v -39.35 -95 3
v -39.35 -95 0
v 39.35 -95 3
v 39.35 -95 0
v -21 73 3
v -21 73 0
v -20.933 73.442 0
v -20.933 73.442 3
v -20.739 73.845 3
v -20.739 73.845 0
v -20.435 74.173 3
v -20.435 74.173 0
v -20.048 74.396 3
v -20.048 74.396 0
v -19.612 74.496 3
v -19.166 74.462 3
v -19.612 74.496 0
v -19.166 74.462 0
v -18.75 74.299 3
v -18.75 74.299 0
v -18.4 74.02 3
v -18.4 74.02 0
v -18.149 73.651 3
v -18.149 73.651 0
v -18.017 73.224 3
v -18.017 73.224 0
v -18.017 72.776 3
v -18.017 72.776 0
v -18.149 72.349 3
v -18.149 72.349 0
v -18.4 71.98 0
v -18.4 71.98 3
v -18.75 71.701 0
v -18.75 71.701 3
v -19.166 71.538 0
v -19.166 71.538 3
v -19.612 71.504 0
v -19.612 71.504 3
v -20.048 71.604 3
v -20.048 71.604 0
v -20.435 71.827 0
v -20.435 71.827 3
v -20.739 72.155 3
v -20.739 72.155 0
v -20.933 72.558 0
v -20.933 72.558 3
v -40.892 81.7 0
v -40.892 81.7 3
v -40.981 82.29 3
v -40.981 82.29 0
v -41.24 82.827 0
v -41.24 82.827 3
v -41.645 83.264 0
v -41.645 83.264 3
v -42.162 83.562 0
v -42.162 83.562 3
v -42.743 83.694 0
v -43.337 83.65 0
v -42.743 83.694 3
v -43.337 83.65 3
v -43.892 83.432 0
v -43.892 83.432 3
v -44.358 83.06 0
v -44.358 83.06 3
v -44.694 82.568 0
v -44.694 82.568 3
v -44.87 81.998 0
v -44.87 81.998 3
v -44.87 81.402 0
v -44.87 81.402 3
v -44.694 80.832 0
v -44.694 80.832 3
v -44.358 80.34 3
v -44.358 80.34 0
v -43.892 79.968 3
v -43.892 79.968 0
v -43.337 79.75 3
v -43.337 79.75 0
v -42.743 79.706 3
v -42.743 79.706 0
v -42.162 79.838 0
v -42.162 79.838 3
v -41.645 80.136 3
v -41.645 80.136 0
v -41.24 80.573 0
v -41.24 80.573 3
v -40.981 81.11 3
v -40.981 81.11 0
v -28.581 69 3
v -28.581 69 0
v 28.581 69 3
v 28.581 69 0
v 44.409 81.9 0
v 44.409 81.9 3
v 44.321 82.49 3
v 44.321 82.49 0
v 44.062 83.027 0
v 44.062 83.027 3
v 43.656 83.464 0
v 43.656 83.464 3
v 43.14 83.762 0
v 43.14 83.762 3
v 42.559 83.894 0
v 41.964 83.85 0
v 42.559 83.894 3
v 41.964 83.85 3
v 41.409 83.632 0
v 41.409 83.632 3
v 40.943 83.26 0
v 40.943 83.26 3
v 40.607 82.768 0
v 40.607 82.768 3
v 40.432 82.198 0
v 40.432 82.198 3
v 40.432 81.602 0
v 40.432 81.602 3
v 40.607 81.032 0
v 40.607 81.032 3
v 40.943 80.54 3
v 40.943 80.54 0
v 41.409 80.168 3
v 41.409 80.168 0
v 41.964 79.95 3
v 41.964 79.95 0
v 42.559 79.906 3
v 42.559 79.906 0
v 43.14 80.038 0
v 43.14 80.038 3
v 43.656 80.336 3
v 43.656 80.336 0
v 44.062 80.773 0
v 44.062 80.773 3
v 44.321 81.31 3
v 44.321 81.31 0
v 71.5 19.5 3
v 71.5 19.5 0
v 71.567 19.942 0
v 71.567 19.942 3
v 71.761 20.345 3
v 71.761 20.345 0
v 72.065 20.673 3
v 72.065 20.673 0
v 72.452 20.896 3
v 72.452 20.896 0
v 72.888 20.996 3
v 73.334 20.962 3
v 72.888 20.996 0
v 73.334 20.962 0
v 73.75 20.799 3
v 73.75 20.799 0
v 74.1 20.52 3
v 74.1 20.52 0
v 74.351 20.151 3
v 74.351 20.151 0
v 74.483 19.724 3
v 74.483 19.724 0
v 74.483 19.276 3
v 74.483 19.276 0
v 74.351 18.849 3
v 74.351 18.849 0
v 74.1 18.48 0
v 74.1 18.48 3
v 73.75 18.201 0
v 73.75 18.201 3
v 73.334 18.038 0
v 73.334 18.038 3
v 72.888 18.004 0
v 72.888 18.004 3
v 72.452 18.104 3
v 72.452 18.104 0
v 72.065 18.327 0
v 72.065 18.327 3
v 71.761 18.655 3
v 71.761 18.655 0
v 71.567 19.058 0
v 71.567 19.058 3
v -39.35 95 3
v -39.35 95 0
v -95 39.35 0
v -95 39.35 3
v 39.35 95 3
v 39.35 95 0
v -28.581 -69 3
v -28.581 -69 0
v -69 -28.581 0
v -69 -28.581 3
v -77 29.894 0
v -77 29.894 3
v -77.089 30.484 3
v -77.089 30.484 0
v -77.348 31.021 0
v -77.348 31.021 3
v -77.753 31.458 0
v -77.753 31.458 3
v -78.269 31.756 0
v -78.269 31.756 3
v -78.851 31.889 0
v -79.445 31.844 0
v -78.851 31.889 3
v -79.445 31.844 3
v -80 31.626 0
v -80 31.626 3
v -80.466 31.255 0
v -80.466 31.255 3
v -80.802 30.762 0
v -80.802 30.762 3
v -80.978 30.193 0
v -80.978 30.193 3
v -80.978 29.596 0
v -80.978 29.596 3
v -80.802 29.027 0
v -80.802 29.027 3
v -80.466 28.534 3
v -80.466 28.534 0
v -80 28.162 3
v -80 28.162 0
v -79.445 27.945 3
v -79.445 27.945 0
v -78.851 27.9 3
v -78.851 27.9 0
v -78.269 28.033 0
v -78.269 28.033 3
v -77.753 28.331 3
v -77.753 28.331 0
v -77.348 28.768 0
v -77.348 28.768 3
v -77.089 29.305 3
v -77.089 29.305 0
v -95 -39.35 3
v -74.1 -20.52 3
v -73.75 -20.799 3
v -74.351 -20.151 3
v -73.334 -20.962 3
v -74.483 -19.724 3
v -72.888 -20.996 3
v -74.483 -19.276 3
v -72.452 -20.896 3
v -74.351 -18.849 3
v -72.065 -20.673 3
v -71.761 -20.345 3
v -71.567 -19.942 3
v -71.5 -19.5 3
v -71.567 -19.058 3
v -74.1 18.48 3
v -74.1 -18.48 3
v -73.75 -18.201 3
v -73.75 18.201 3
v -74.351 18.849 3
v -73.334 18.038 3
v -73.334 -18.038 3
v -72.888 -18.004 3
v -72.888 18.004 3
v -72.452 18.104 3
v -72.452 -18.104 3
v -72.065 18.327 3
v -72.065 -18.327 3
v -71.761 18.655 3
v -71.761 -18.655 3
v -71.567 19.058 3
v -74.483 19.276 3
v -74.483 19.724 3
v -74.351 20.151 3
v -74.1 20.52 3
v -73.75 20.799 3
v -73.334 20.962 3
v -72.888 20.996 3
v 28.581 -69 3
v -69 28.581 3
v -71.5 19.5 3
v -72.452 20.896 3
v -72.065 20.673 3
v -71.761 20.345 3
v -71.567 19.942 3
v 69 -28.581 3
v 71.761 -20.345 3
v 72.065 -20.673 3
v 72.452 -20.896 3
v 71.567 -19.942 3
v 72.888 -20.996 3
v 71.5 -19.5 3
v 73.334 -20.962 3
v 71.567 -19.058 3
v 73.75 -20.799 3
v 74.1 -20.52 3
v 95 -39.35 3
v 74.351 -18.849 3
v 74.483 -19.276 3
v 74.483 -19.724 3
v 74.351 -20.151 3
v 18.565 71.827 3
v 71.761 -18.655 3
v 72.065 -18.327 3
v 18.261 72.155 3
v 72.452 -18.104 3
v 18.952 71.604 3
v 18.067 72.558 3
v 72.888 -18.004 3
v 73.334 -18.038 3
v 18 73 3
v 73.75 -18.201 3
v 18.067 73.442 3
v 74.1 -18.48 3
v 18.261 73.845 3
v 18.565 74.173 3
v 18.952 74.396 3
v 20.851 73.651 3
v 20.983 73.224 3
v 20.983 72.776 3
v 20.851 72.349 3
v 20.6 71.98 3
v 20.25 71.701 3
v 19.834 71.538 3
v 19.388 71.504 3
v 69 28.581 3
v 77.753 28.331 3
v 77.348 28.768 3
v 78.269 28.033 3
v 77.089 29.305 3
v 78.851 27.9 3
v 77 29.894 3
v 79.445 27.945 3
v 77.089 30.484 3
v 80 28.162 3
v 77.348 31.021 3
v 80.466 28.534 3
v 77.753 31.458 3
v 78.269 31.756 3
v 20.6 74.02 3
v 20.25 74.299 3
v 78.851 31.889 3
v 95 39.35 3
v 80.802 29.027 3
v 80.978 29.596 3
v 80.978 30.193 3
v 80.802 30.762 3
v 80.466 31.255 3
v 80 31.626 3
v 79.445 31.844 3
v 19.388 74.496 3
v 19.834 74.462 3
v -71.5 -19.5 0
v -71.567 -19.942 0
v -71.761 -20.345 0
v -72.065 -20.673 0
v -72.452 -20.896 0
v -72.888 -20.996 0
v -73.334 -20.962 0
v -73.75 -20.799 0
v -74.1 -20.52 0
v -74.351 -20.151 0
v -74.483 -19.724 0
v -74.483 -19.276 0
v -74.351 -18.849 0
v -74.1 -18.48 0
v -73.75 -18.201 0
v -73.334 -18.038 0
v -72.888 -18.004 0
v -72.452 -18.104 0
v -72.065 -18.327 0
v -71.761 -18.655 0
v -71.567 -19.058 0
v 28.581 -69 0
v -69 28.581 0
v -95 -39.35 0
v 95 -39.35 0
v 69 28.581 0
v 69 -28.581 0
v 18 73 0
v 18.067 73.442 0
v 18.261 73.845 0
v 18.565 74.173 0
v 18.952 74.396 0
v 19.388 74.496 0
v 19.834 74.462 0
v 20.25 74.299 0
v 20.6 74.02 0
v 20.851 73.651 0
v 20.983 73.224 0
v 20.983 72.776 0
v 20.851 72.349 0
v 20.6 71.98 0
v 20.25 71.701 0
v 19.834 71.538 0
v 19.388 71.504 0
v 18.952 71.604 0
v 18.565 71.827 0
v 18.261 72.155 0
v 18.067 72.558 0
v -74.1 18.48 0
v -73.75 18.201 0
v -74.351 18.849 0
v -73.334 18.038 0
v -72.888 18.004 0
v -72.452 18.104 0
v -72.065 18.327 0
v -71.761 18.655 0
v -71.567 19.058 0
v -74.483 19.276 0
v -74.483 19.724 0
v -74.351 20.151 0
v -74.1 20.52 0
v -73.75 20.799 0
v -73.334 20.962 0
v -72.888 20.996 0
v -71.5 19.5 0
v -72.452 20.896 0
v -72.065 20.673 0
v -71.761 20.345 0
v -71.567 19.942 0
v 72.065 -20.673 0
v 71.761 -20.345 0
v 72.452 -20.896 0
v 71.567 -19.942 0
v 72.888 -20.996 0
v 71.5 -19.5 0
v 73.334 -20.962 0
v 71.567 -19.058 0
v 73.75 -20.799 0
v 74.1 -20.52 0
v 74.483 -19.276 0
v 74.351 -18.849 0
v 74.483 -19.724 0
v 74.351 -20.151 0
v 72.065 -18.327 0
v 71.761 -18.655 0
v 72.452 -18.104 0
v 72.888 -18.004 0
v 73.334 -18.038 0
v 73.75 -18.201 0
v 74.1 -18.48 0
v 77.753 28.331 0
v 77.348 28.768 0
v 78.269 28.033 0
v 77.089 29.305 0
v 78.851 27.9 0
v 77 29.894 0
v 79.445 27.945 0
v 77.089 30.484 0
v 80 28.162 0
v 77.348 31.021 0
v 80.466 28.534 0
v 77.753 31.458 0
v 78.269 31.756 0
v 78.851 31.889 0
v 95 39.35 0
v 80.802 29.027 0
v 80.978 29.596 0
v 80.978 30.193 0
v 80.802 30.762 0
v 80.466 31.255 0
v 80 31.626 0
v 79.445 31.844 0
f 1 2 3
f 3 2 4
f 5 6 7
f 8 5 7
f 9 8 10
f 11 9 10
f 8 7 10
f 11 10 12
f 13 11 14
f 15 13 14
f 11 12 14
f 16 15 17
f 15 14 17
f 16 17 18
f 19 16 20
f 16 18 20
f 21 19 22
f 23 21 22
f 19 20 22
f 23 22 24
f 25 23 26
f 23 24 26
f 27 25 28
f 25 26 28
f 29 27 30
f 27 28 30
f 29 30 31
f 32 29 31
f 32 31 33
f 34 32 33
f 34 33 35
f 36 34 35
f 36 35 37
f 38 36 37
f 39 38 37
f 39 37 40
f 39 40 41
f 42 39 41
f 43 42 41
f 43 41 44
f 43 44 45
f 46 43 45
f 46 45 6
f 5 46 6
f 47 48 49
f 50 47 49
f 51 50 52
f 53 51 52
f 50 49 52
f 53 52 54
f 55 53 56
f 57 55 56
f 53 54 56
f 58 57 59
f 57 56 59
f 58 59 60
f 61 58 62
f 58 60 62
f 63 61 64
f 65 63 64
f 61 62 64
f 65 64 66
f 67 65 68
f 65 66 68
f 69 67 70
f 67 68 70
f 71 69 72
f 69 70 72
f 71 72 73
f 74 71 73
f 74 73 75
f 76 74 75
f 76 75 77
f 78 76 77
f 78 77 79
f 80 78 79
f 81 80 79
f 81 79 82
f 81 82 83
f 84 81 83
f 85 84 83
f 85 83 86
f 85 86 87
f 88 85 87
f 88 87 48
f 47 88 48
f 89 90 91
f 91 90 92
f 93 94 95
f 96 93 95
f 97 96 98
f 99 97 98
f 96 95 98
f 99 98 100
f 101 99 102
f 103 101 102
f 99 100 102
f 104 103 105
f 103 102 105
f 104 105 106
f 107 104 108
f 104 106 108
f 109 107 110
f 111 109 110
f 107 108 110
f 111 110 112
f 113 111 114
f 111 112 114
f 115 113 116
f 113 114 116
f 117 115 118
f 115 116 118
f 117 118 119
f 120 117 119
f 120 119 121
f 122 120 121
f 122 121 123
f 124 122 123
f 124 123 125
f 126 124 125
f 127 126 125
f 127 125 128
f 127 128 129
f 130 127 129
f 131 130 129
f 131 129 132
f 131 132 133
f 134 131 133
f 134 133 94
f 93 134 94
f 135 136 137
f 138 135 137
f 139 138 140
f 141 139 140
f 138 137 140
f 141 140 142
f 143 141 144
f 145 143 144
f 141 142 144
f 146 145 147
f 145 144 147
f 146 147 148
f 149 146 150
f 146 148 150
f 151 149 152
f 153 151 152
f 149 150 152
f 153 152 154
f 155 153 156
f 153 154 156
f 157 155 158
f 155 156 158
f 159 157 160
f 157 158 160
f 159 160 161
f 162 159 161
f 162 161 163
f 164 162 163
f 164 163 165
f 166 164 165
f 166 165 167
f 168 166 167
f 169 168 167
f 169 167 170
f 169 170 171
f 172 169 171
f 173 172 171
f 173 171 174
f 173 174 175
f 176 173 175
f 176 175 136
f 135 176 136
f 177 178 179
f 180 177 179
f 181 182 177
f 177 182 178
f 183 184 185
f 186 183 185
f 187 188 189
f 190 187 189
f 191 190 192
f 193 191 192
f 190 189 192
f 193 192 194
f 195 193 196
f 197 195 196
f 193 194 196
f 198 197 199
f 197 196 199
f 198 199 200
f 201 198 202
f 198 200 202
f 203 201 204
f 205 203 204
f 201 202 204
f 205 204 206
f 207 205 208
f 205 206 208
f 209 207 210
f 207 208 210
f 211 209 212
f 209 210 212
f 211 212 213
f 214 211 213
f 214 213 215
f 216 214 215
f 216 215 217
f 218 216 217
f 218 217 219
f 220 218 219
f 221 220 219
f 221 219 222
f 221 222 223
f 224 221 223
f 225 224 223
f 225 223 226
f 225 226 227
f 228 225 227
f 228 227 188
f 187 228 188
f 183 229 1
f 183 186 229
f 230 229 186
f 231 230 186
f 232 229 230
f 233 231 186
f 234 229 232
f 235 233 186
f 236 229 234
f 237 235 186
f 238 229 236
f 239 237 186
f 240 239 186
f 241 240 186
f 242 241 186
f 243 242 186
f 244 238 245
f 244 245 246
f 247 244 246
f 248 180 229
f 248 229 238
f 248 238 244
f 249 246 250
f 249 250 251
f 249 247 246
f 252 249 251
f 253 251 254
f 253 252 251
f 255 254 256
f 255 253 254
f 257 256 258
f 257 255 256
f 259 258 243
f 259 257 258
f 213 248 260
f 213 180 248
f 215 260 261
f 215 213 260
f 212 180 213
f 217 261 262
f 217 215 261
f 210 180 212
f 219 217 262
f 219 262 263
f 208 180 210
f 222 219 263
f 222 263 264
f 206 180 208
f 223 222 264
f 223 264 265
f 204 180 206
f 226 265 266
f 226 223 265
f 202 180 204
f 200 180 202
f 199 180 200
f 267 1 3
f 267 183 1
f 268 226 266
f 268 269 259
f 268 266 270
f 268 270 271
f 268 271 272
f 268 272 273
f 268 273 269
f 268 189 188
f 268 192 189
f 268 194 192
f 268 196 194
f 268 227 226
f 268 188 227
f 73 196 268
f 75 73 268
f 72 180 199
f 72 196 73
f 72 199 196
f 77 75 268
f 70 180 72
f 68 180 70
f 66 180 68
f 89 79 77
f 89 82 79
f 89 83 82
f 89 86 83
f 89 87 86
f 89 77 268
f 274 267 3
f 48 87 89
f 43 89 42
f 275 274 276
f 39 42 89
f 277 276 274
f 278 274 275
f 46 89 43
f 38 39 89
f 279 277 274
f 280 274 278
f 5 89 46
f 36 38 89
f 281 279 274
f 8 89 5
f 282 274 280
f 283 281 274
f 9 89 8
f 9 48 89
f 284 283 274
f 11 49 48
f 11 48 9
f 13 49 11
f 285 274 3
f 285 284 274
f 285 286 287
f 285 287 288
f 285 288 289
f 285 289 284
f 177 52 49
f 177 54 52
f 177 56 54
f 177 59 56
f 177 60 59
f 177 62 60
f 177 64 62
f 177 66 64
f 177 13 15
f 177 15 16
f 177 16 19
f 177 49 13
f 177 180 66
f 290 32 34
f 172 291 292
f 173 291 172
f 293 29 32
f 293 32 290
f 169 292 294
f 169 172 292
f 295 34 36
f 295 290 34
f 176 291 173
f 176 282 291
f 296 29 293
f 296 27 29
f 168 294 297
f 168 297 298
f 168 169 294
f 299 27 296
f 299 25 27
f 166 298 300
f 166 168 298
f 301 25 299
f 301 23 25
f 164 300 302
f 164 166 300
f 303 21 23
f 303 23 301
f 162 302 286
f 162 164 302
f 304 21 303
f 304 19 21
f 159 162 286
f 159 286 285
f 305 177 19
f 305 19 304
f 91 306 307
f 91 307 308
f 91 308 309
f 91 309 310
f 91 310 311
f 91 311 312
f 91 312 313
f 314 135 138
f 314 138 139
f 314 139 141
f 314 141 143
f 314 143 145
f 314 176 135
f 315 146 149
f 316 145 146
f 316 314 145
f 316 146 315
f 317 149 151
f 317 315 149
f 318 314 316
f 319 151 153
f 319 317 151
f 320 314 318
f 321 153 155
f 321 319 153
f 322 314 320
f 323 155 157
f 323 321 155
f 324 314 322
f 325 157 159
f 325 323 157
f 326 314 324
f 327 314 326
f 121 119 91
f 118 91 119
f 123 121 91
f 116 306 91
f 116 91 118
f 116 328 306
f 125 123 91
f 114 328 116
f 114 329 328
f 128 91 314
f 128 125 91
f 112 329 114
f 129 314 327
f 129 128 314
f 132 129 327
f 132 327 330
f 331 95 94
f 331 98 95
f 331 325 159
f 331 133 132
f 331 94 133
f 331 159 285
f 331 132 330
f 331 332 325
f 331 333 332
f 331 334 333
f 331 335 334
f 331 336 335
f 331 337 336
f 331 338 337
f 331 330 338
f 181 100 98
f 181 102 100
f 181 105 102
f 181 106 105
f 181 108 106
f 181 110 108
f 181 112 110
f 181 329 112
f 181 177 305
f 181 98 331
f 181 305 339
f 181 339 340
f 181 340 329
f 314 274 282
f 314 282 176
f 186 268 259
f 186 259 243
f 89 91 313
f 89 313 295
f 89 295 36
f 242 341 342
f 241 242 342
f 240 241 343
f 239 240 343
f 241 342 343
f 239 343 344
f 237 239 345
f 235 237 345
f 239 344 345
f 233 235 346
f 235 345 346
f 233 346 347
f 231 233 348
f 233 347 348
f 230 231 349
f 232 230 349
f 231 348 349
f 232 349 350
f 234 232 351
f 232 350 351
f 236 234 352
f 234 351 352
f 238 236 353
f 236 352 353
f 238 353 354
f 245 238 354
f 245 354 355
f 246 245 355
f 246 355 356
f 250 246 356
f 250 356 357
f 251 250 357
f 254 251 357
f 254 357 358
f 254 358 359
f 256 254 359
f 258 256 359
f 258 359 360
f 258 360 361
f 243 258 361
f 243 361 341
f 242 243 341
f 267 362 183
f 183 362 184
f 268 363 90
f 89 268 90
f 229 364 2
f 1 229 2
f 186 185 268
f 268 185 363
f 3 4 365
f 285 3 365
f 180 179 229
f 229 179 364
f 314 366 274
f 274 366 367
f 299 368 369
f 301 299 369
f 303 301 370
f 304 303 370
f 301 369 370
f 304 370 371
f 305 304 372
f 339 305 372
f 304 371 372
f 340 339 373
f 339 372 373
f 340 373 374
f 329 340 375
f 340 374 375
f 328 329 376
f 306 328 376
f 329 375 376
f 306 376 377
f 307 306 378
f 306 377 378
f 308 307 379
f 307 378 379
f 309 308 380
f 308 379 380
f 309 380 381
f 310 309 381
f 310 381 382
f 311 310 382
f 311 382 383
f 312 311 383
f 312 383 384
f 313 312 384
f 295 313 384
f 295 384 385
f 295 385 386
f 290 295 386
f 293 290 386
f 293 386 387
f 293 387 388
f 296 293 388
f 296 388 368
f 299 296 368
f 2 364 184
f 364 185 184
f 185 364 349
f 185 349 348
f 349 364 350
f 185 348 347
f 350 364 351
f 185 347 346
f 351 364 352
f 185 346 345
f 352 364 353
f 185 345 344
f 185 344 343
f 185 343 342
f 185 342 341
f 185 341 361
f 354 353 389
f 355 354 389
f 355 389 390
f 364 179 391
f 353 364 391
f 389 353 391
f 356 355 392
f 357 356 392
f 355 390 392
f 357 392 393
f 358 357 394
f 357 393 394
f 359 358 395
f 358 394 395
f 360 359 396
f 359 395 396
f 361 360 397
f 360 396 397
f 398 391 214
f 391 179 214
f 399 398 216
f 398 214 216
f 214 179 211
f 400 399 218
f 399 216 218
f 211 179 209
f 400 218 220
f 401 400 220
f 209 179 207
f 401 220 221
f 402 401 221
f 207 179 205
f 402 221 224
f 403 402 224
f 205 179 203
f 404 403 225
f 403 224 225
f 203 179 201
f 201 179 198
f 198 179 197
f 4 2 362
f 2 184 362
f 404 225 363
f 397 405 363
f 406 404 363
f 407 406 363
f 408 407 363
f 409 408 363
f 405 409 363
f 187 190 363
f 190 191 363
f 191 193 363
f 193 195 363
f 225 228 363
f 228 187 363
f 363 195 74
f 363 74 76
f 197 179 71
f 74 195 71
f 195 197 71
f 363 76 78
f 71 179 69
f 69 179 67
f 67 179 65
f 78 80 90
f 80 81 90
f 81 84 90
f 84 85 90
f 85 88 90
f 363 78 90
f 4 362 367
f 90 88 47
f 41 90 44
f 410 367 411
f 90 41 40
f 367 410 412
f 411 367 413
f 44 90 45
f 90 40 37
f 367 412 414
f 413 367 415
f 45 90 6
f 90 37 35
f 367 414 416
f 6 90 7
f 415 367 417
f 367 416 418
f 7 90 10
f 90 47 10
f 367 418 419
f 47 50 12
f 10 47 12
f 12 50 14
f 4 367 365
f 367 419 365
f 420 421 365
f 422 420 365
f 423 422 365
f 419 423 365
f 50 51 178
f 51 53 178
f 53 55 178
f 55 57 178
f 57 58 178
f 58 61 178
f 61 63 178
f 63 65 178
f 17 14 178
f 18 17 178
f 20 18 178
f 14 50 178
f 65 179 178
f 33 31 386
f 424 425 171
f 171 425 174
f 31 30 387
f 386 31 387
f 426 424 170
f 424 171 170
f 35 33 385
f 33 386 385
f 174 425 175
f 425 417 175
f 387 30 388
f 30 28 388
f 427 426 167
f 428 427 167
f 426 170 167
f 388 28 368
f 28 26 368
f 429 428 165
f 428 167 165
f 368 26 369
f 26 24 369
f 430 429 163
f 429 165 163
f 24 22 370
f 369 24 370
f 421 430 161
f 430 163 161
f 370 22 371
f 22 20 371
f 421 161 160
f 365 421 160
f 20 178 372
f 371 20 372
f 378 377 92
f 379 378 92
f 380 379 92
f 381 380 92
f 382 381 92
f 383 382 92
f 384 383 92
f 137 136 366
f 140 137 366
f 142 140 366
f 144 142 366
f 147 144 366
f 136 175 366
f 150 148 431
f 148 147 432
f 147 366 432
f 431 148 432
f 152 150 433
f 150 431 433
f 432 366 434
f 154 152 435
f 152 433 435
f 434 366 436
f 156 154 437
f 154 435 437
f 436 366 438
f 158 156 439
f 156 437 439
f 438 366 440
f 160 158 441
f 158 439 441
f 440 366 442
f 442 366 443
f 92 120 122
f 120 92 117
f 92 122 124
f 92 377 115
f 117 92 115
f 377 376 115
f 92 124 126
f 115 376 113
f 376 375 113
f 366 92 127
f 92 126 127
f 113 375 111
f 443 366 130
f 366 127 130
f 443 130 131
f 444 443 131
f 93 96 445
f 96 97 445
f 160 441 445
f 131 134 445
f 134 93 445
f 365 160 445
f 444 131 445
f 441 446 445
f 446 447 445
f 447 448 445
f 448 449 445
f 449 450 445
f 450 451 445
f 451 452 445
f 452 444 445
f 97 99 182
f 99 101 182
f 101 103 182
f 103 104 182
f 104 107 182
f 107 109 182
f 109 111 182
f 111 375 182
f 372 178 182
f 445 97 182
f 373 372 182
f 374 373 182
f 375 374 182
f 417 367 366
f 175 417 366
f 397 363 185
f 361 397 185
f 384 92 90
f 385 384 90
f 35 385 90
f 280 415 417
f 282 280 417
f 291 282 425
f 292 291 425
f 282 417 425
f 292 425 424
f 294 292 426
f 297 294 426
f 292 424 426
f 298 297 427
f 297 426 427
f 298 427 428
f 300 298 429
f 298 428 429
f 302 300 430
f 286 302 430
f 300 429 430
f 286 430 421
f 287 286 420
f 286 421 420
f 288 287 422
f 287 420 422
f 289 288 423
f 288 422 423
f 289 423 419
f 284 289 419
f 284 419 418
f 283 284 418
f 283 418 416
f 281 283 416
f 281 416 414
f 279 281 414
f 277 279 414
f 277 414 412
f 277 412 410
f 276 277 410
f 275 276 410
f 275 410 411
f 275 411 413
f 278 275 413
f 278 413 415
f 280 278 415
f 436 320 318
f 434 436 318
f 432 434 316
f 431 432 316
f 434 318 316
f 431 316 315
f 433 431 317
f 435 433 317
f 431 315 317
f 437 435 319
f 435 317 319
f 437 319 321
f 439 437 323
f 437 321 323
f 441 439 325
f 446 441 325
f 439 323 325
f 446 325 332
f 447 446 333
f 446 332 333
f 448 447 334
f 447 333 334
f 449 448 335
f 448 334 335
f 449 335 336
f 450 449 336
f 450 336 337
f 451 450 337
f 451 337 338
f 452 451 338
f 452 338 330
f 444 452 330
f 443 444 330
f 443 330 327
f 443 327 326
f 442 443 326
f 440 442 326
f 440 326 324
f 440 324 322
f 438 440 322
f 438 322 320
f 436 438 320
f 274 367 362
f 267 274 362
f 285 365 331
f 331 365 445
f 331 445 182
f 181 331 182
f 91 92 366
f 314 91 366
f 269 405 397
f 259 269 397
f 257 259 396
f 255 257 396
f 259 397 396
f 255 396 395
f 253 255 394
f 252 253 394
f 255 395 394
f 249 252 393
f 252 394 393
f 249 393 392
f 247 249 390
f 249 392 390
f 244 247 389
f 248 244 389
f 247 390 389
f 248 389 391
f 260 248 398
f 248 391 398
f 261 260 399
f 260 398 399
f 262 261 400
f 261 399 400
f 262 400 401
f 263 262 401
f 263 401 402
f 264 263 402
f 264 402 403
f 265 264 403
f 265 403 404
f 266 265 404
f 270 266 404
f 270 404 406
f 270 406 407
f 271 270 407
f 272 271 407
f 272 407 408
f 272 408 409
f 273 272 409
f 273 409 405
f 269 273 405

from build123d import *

# Parameters (mm, degrees)
SALIENTE_EXTRUIR1_DEPTH = 3
CORTAR_EXTRUIR1_DEPTH   = 3
CROQUIS3_R              = 1.5
CORTAR_EXTRUIR2_DEPTH   = 135.383778783
CROQUIS5_R              = 2
CORTAR_EXTRUIR3_DEPTH   = 135.383778783


with BuildPart() as part:
    # Croquis1 → Saliente-Extruir1 (new body)
    with BuildSketch(Plane.XY):
        Polygon((-39.350288425, -95), (39.350288425, -95), (95, -39.350288425), (95, 39.350288425), (39.350288425, 95), (-39.350288425, 95), (-95, 39.350288425), (-95, -39.350288425), align=None)
    extrude(amount=SALIENTE_EXTRUIR1_DEPTH)

    # Croquis2 → Cortar-Extruir1 (cut)
    with BuildSketch(Plane(origin=(0, 0, 0), x_dir=(-1, 0, 0), z_dir=(0, 0, -1))):
        Polygon((-69, -28.580735804), (-28.580735804, -69), (28.580735804, -69), (69, -28.580735804), (69, 28.580735804), (28.580735804, 69), (-28.580735804, 69), (-69, 28.580735804), align=None)
    extrude(amount=-CORTAR_EXTRUIR1_DEPTH, mode=Mode.SUBTRACT)

    # Croquis3 → Cortar-Extruir2 (cut, through all)
    with BuildSketch(Plane(origin=(0, 0, 0), x_dir=(-1, 0, 0), z_dir=(0, 0, -1))):
        with Locations((-19.5, 73)):
            Circle(CROQUIS3_R)
        with Locations((19.5, 73)):
            Circle(CROQUIS3_R)
        with Locations((-73, 19.5)):
            Circle(CROQUIS3_R)
        with Locations((-73, -19.5)):
            Circle(CROQUIS3_R)
        with Locations(Location((73, 19.5, 0), (0, 0, 180))):
            Circle(CROQUIS3_R)
        with Locations(Location((73, -19.5, 0), (0, 0, 180))):
            Circle(CROQUIS3_R)
    extrude(amount=-CORTAR_EXTRUIR2_DEPTH, mode=Mode.SUBTRACT)

    # Croquis5 → Cortar-Extruir3 (cut, through all)
    with BuildSketch(Plane.XY.offset(3)):
        with Locations((-42.892214845, 81.7)):
            Circle(CROQUIS5_R)
        with Locations((42.409372133, 81.9)):
            Circle(CROQUIS5_R)
        with Locations((-79, 29.894444303)):
            Circle(CROQUIS5_R)
        with Locations(Location((79, 29.894444303, 0), (0, 0, 180))):
            Circle(CROQUIS5_R)
    extrude(amount=-CORTAR_EXTRUIR3_DEPTH, mode=Mode.SUBTRACT)


solid = part.part
